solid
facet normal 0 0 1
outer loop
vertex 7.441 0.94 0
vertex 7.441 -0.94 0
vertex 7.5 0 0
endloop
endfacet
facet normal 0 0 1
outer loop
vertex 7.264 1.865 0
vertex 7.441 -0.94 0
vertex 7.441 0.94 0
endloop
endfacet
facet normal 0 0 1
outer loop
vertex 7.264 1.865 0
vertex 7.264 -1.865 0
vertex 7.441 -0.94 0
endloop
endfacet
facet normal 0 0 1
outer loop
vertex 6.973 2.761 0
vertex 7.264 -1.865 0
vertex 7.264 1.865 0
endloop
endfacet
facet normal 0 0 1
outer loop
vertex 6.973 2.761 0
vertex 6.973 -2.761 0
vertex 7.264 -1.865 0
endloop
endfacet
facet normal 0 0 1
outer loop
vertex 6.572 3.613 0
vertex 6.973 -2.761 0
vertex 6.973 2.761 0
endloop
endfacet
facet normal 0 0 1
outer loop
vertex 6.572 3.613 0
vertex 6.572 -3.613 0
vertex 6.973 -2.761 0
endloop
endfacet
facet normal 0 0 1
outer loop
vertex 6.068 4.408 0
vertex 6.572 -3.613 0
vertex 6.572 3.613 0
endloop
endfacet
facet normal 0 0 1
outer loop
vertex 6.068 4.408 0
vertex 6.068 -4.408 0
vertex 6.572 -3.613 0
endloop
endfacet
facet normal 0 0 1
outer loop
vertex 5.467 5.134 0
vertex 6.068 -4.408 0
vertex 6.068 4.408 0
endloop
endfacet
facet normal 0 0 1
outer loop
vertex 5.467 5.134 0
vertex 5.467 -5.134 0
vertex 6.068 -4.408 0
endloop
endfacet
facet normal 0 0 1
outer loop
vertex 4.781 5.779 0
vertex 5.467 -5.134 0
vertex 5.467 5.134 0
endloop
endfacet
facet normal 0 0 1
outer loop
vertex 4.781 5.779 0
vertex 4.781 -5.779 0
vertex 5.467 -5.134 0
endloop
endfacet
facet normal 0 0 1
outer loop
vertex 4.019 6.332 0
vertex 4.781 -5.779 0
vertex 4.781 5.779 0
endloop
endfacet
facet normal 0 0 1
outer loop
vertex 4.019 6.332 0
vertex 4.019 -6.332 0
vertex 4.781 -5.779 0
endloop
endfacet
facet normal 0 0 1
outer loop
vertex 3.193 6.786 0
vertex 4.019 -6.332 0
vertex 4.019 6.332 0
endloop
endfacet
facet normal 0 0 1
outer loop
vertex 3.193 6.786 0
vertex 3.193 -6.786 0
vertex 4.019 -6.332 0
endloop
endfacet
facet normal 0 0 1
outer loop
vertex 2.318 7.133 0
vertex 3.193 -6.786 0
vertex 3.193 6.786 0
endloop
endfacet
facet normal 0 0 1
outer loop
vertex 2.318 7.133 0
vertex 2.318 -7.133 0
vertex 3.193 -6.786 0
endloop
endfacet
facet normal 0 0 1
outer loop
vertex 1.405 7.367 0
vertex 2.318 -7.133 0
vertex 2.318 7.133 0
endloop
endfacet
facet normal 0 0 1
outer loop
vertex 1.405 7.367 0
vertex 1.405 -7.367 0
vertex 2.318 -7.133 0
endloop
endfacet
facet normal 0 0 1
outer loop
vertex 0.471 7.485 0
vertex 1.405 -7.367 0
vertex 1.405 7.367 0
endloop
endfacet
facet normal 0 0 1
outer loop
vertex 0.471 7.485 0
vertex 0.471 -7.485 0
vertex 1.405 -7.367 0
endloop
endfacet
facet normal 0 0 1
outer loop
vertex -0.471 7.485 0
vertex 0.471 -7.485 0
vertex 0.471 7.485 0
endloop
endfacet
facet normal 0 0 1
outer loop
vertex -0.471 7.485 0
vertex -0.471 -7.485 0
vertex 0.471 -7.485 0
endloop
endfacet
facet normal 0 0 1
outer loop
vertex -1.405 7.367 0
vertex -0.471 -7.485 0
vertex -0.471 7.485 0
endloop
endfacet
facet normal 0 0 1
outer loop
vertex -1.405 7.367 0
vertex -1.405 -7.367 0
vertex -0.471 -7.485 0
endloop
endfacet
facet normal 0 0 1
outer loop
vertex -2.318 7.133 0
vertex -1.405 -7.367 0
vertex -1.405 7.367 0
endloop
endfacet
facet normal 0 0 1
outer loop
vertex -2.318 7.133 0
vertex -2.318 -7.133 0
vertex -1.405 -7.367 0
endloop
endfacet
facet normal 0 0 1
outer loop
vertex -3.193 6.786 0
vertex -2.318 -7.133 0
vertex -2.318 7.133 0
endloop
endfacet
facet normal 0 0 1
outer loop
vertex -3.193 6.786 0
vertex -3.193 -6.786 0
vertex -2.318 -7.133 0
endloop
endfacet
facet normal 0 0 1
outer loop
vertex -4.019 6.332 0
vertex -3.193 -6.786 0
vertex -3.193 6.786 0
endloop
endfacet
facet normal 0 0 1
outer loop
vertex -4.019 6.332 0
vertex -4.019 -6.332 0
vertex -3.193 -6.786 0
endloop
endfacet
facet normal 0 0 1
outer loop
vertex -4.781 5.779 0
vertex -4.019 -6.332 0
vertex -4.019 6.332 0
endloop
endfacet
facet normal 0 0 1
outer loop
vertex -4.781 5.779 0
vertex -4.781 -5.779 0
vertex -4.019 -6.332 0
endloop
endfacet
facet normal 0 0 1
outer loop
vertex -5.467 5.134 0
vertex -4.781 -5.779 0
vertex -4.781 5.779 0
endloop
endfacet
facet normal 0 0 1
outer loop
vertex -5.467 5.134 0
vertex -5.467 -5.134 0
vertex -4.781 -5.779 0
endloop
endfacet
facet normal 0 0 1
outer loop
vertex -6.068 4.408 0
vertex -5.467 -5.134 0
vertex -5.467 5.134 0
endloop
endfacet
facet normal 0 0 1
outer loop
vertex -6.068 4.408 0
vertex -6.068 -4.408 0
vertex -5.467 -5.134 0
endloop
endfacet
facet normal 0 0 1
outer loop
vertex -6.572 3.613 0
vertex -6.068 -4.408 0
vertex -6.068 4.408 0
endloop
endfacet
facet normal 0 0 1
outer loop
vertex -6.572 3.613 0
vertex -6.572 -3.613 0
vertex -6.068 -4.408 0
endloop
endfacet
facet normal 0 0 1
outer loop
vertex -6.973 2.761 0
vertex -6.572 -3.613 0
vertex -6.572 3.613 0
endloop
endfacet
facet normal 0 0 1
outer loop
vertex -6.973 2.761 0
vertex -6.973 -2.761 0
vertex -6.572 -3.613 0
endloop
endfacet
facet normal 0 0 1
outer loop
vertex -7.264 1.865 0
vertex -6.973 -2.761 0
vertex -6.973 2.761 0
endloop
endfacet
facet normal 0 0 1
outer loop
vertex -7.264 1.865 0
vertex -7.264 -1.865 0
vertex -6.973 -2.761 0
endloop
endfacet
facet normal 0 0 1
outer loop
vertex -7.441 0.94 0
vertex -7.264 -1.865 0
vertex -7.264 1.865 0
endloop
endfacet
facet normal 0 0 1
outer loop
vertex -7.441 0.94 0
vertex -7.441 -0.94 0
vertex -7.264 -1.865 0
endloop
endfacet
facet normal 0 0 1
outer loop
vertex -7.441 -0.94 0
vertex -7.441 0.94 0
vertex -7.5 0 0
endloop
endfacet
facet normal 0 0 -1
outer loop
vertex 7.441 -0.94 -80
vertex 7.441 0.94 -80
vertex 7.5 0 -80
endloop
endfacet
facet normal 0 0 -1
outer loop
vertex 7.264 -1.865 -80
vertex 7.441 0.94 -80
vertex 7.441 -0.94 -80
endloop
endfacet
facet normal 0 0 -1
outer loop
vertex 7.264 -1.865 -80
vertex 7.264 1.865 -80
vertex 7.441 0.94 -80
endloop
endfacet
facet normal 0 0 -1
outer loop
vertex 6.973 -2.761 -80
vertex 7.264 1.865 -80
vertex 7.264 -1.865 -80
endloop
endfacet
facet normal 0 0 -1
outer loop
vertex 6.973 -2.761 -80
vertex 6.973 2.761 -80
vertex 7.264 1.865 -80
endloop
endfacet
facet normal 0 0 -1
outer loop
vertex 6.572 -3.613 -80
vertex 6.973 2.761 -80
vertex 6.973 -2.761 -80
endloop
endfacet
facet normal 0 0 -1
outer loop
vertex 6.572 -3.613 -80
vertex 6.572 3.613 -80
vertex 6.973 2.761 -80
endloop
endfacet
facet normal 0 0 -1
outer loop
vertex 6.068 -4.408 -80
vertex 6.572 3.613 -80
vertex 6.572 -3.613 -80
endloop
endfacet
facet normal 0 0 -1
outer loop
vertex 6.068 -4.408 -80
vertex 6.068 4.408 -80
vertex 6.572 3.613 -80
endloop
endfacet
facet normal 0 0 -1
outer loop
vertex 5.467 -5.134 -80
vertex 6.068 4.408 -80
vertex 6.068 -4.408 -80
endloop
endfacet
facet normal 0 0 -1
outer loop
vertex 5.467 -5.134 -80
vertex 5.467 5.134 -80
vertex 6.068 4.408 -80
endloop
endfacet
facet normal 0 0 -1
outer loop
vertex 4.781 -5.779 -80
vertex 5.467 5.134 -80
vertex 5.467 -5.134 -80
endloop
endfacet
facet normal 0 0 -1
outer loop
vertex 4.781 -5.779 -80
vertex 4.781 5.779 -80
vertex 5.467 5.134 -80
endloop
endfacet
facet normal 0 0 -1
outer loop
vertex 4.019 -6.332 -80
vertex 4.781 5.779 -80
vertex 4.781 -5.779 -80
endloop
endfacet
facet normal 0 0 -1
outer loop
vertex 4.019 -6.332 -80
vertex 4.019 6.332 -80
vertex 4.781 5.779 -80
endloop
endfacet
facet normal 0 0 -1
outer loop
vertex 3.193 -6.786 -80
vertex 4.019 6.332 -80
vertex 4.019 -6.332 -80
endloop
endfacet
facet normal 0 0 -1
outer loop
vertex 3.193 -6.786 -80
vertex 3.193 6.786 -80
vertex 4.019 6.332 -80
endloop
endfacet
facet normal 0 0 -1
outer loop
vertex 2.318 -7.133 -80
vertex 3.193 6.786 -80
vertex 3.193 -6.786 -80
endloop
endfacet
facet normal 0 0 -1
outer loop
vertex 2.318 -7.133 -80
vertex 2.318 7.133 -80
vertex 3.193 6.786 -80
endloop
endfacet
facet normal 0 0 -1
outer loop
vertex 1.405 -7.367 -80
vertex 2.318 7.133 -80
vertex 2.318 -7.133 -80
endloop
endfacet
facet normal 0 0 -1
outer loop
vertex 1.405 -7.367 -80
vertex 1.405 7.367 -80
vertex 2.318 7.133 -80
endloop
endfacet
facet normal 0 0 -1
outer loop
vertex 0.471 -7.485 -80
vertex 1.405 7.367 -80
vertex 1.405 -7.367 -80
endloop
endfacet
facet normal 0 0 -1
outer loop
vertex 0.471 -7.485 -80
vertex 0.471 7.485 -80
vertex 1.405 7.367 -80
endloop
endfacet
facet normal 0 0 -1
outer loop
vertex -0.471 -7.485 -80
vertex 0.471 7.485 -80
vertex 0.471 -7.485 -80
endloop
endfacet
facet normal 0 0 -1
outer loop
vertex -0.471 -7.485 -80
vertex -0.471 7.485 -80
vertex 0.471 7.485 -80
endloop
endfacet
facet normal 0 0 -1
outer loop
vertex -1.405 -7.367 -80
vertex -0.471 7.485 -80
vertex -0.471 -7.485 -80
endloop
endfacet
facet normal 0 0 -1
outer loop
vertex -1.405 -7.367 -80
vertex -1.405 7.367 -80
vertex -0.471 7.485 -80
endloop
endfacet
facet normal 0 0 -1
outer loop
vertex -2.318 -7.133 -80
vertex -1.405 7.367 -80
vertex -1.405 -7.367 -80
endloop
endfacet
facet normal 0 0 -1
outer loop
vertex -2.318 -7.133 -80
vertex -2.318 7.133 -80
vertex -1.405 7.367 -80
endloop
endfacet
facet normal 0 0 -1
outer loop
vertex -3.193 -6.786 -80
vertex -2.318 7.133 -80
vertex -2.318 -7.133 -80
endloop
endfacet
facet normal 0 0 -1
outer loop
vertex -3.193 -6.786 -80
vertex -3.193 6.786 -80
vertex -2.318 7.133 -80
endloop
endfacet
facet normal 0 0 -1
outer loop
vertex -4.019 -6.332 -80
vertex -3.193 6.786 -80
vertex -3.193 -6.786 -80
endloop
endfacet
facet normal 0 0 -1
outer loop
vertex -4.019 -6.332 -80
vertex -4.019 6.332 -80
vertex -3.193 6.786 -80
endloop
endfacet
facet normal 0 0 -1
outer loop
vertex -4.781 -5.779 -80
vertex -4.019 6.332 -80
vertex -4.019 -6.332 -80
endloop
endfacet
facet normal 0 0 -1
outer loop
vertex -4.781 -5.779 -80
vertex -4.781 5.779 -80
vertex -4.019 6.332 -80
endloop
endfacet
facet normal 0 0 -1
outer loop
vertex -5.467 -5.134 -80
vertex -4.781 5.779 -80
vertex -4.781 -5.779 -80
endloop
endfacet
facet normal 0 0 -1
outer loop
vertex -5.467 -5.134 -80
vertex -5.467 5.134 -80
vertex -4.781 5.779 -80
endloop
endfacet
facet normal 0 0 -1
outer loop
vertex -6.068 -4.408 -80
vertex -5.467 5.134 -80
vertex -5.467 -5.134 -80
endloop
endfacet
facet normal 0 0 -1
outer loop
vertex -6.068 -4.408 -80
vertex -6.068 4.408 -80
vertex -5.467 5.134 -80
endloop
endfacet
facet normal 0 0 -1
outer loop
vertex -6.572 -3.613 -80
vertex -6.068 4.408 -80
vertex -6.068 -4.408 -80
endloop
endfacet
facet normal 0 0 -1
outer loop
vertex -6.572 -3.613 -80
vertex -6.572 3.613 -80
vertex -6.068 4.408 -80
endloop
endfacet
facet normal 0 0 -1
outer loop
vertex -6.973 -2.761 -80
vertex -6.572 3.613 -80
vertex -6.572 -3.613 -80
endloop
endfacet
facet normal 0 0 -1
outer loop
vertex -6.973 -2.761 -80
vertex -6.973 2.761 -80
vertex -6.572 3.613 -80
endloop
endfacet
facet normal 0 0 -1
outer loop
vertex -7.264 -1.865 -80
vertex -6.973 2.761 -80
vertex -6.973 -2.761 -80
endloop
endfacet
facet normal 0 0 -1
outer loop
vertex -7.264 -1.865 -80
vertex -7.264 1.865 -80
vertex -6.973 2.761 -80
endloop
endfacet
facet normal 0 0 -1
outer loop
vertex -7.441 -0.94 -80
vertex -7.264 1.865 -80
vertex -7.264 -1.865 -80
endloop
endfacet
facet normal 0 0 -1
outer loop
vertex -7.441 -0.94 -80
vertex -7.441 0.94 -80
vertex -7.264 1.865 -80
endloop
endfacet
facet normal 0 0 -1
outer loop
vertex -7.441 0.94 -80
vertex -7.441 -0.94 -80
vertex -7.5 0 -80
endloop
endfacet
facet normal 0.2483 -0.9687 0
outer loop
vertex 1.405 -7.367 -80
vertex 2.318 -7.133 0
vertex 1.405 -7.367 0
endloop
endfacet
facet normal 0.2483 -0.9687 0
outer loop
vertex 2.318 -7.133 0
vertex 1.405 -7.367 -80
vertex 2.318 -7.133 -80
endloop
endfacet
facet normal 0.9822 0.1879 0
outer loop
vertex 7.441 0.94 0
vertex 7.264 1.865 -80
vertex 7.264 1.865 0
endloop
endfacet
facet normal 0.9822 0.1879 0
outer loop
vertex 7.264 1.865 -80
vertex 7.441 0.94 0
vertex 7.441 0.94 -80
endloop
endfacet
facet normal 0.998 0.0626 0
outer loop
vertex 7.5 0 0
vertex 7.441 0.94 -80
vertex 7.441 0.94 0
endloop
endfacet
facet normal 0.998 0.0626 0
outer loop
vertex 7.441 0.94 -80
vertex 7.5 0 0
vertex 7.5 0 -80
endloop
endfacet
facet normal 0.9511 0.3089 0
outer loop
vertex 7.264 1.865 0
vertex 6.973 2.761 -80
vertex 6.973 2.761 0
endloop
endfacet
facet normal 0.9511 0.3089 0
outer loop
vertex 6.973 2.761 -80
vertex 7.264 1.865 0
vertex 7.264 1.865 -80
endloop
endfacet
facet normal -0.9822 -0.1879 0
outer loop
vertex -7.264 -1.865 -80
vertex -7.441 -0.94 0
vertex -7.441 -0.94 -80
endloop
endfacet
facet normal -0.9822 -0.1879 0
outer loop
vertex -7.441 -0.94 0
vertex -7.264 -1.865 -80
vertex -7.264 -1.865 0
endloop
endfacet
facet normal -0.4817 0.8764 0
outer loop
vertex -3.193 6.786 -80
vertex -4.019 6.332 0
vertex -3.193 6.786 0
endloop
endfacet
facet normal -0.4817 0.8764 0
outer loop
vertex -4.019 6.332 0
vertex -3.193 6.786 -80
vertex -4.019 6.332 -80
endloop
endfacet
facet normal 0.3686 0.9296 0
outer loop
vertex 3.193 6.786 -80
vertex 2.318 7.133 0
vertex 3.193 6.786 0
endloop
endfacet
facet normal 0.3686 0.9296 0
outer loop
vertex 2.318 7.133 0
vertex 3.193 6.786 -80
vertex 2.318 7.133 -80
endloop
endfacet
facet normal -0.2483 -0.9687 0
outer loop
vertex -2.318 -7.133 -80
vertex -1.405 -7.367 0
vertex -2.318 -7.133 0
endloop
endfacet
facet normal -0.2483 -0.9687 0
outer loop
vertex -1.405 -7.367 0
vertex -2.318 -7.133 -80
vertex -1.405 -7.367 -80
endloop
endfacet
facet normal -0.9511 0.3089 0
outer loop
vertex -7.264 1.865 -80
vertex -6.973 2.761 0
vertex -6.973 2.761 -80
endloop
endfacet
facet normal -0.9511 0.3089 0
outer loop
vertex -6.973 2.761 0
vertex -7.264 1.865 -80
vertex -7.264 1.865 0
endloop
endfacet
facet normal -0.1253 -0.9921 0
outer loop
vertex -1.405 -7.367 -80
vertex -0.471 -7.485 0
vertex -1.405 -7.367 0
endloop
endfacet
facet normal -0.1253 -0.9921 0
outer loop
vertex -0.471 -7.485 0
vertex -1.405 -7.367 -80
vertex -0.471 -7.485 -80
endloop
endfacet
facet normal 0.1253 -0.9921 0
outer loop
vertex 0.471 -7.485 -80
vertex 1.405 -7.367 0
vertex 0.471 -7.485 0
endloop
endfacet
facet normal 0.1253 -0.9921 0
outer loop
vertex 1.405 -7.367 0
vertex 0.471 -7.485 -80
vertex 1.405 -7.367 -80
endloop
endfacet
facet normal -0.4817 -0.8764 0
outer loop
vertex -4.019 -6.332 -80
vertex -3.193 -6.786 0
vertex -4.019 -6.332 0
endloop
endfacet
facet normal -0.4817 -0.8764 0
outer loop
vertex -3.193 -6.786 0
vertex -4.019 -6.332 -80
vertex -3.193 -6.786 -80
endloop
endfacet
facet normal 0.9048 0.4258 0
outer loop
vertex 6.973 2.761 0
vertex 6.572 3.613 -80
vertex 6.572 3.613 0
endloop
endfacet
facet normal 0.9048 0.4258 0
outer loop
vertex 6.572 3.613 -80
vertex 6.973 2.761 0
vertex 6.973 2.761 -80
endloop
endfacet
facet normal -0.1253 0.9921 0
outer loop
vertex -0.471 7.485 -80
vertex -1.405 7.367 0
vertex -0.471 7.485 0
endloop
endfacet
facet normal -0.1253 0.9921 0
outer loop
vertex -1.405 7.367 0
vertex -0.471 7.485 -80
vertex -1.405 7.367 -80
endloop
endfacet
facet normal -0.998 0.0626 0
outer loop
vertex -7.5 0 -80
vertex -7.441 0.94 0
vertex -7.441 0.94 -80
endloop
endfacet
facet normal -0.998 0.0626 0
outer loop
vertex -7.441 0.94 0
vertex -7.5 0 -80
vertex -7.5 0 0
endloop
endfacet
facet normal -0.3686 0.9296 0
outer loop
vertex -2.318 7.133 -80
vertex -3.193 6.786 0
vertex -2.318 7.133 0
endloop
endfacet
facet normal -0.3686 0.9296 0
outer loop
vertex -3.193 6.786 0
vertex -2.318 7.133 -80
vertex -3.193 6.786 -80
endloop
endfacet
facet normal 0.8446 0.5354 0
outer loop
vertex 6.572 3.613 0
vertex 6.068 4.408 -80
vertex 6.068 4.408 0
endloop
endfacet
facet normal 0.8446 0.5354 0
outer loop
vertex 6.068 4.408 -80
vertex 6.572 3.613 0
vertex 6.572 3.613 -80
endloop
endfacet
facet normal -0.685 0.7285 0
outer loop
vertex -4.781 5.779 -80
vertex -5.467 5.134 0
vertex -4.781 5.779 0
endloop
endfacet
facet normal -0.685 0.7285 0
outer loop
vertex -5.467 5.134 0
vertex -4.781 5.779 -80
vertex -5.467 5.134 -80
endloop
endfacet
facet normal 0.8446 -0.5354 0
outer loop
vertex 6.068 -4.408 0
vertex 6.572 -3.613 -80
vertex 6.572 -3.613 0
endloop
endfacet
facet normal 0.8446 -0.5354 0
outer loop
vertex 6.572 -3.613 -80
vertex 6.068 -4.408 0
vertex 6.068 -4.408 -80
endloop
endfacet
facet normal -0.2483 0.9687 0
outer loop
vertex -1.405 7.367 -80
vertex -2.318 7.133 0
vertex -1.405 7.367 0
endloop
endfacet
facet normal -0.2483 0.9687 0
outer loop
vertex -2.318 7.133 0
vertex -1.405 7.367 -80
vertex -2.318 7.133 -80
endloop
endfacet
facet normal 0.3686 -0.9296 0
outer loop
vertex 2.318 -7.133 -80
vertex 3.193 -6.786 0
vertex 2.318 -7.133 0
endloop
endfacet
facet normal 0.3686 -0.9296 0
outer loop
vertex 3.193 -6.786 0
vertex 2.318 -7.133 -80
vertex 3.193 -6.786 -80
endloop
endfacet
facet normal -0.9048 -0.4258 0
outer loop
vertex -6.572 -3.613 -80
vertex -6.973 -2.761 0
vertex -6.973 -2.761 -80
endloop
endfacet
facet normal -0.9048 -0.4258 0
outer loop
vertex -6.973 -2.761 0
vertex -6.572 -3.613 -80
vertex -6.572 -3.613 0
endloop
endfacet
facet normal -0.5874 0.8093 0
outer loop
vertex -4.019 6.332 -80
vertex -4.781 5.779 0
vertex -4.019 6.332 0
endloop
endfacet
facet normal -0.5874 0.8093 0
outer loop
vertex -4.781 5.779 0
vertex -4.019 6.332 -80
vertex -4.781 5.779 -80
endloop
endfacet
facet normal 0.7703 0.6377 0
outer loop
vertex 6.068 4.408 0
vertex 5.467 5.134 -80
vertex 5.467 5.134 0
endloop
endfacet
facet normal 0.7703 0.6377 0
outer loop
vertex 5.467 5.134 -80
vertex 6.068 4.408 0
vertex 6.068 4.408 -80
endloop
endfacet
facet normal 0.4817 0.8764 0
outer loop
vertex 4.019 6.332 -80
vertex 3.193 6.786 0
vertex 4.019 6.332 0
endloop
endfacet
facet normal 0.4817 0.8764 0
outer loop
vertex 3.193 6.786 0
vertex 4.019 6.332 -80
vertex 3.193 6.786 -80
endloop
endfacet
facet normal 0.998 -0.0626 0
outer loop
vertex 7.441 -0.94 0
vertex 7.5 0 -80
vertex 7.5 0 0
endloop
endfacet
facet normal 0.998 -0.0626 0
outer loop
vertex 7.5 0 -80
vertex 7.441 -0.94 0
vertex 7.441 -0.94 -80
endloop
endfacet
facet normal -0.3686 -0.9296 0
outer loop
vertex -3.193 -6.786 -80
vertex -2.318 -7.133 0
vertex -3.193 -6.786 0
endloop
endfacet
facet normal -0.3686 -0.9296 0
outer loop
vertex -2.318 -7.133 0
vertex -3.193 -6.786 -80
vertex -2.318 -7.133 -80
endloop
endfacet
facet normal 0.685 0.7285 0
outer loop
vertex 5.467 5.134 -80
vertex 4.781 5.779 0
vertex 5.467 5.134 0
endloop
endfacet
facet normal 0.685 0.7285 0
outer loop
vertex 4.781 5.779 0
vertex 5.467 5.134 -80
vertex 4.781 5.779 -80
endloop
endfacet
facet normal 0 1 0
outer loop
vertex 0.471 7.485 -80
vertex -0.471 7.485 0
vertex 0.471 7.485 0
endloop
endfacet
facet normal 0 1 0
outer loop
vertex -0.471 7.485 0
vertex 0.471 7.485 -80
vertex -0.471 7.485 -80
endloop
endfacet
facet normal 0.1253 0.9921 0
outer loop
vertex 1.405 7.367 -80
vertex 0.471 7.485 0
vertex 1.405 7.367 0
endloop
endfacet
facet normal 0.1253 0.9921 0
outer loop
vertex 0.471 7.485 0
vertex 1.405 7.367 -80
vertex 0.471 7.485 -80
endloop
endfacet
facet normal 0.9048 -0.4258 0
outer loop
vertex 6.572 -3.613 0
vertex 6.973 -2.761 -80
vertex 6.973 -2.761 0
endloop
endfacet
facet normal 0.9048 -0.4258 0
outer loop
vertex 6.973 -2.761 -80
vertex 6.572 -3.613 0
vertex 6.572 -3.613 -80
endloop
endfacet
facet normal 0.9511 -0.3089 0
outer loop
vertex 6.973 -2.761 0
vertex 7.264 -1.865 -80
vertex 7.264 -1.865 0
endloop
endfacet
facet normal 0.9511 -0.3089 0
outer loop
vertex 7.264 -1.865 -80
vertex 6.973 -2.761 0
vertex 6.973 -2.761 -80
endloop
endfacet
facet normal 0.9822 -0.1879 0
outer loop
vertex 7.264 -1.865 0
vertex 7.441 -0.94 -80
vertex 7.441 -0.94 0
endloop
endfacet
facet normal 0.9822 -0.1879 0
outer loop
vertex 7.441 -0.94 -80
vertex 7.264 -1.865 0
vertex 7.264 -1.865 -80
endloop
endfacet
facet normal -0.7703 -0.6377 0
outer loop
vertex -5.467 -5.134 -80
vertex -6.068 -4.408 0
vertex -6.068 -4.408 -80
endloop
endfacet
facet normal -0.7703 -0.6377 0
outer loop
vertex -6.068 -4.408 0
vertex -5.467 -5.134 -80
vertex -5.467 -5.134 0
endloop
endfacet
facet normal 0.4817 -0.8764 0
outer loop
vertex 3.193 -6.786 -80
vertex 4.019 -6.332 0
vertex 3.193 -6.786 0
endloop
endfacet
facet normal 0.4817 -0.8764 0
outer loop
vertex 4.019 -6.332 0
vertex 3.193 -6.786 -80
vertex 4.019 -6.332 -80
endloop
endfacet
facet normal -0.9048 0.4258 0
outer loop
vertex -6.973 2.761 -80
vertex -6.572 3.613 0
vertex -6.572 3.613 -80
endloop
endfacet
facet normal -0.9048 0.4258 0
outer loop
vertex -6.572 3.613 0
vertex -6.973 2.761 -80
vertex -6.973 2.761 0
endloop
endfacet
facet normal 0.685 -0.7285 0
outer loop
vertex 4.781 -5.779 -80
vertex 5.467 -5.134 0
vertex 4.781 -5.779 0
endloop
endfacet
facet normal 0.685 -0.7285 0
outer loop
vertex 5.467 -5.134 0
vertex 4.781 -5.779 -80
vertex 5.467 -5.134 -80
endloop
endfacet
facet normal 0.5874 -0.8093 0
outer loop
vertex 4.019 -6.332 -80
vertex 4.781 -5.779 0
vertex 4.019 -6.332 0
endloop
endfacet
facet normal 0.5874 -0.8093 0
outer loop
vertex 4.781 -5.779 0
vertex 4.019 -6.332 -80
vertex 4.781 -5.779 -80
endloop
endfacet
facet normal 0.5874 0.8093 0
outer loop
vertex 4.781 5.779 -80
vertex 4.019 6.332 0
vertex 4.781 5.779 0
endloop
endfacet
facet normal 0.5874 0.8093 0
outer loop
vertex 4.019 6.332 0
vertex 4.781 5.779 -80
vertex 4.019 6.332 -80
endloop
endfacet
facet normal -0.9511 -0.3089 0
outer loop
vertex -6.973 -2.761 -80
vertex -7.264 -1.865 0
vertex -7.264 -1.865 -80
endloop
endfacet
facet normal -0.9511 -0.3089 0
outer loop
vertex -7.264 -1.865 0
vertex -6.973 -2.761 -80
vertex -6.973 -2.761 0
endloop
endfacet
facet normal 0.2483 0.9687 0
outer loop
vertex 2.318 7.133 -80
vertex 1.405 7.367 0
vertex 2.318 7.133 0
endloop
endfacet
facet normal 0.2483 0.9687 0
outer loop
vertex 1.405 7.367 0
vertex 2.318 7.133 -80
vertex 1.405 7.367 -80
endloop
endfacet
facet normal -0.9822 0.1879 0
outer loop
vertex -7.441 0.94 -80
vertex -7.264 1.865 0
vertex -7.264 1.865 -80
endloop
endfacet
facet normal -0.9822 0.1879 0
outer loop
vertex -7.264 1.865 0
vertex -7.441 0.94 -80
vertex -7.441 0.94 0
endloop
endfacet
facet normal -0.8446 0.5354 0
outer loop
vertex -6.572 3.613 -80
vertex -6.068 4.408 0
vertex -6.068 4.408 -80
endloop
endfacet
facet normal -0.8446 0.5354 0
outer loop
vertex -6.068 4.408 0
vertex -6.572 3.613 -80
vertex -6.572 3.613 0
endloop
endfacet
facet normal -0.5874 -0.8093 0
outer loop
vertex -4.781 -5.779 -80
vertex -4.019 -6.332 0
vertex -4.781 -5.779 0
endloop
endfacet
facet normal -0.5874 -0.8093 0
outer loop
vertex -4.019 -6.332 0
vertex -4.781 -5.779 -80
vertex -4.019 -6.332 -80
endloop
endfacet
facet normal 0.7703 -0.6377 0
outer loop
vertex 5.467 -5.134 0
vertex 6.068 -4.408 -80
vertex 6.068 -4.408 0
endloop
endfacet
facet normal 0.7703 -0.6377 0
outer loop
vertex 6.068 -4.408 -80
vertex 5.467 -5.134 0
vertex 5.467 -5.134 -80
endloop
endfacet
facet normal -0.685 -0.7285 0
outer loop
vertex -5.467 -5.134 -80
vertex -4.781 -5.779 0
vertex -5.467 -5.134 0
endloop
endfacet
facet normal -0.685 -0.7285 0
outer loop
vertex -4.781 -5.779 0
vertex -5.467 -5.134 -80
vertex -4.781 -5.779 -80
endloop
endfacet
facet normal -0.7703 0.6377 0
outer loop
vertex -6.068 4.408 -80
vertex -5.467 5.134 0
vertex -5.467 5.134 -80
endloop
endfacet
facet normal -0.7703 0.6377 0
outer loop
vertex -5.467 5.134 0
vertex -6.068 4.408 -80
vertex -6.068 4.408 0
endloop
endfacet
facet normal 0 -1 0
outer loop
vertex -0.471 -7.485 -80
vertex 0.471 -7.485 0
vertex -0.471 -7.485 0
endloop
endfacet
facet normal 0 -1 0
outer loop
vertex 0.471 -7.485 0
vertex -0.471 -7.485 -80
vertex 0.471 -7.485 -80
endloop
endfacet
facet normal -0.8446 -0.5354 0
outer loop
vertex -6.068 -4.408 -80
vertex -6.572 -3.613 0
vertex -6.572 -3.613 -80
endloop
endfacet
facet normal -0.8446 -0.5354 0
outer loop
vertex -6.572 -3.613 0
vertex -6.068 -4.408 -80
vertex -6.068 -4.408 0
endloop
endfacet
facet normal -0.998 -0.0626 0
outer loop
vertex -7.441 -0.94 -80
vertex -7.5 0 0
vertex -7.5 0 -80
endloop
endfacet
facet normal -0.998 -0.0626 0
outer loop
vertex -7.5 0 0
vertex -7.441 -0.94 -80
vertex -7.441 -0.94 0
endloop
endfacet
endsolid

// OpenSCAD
$fn = 50;


difference() {
	union() {
		translate(v = [0, 0, 0]) {
			rotate(a = [0, 0, 0]) {
				difference() {
					union() {
						#translate(v = [0, 0, -80.0000000000]) {
							cylinder(h = 80, r = 2.0000000000);
						}
						#translate(v = [0, 0, -3.9000000000]) {
							cylinder(h = 3.9000000000, r = 7.5000000000, r1 = 2.2500000000, r2 = 6.1000000000);
						}
						#translate(v = [0, 0, -80.0000000000]) {
							cylinder(h = 80, r = 2.2500000000);
						}
						#translate(v = [0, 0, -80.0000000000]) {
							cylinder(h = 80, r = 2.0000000000);
						}
					}
					union();
				}
			}
		}
		translate(v = [0, 0, -80.0000000000]) {
			cylinder(h = 80, r = 7.5000000000);
		}
	}
	union();
}
